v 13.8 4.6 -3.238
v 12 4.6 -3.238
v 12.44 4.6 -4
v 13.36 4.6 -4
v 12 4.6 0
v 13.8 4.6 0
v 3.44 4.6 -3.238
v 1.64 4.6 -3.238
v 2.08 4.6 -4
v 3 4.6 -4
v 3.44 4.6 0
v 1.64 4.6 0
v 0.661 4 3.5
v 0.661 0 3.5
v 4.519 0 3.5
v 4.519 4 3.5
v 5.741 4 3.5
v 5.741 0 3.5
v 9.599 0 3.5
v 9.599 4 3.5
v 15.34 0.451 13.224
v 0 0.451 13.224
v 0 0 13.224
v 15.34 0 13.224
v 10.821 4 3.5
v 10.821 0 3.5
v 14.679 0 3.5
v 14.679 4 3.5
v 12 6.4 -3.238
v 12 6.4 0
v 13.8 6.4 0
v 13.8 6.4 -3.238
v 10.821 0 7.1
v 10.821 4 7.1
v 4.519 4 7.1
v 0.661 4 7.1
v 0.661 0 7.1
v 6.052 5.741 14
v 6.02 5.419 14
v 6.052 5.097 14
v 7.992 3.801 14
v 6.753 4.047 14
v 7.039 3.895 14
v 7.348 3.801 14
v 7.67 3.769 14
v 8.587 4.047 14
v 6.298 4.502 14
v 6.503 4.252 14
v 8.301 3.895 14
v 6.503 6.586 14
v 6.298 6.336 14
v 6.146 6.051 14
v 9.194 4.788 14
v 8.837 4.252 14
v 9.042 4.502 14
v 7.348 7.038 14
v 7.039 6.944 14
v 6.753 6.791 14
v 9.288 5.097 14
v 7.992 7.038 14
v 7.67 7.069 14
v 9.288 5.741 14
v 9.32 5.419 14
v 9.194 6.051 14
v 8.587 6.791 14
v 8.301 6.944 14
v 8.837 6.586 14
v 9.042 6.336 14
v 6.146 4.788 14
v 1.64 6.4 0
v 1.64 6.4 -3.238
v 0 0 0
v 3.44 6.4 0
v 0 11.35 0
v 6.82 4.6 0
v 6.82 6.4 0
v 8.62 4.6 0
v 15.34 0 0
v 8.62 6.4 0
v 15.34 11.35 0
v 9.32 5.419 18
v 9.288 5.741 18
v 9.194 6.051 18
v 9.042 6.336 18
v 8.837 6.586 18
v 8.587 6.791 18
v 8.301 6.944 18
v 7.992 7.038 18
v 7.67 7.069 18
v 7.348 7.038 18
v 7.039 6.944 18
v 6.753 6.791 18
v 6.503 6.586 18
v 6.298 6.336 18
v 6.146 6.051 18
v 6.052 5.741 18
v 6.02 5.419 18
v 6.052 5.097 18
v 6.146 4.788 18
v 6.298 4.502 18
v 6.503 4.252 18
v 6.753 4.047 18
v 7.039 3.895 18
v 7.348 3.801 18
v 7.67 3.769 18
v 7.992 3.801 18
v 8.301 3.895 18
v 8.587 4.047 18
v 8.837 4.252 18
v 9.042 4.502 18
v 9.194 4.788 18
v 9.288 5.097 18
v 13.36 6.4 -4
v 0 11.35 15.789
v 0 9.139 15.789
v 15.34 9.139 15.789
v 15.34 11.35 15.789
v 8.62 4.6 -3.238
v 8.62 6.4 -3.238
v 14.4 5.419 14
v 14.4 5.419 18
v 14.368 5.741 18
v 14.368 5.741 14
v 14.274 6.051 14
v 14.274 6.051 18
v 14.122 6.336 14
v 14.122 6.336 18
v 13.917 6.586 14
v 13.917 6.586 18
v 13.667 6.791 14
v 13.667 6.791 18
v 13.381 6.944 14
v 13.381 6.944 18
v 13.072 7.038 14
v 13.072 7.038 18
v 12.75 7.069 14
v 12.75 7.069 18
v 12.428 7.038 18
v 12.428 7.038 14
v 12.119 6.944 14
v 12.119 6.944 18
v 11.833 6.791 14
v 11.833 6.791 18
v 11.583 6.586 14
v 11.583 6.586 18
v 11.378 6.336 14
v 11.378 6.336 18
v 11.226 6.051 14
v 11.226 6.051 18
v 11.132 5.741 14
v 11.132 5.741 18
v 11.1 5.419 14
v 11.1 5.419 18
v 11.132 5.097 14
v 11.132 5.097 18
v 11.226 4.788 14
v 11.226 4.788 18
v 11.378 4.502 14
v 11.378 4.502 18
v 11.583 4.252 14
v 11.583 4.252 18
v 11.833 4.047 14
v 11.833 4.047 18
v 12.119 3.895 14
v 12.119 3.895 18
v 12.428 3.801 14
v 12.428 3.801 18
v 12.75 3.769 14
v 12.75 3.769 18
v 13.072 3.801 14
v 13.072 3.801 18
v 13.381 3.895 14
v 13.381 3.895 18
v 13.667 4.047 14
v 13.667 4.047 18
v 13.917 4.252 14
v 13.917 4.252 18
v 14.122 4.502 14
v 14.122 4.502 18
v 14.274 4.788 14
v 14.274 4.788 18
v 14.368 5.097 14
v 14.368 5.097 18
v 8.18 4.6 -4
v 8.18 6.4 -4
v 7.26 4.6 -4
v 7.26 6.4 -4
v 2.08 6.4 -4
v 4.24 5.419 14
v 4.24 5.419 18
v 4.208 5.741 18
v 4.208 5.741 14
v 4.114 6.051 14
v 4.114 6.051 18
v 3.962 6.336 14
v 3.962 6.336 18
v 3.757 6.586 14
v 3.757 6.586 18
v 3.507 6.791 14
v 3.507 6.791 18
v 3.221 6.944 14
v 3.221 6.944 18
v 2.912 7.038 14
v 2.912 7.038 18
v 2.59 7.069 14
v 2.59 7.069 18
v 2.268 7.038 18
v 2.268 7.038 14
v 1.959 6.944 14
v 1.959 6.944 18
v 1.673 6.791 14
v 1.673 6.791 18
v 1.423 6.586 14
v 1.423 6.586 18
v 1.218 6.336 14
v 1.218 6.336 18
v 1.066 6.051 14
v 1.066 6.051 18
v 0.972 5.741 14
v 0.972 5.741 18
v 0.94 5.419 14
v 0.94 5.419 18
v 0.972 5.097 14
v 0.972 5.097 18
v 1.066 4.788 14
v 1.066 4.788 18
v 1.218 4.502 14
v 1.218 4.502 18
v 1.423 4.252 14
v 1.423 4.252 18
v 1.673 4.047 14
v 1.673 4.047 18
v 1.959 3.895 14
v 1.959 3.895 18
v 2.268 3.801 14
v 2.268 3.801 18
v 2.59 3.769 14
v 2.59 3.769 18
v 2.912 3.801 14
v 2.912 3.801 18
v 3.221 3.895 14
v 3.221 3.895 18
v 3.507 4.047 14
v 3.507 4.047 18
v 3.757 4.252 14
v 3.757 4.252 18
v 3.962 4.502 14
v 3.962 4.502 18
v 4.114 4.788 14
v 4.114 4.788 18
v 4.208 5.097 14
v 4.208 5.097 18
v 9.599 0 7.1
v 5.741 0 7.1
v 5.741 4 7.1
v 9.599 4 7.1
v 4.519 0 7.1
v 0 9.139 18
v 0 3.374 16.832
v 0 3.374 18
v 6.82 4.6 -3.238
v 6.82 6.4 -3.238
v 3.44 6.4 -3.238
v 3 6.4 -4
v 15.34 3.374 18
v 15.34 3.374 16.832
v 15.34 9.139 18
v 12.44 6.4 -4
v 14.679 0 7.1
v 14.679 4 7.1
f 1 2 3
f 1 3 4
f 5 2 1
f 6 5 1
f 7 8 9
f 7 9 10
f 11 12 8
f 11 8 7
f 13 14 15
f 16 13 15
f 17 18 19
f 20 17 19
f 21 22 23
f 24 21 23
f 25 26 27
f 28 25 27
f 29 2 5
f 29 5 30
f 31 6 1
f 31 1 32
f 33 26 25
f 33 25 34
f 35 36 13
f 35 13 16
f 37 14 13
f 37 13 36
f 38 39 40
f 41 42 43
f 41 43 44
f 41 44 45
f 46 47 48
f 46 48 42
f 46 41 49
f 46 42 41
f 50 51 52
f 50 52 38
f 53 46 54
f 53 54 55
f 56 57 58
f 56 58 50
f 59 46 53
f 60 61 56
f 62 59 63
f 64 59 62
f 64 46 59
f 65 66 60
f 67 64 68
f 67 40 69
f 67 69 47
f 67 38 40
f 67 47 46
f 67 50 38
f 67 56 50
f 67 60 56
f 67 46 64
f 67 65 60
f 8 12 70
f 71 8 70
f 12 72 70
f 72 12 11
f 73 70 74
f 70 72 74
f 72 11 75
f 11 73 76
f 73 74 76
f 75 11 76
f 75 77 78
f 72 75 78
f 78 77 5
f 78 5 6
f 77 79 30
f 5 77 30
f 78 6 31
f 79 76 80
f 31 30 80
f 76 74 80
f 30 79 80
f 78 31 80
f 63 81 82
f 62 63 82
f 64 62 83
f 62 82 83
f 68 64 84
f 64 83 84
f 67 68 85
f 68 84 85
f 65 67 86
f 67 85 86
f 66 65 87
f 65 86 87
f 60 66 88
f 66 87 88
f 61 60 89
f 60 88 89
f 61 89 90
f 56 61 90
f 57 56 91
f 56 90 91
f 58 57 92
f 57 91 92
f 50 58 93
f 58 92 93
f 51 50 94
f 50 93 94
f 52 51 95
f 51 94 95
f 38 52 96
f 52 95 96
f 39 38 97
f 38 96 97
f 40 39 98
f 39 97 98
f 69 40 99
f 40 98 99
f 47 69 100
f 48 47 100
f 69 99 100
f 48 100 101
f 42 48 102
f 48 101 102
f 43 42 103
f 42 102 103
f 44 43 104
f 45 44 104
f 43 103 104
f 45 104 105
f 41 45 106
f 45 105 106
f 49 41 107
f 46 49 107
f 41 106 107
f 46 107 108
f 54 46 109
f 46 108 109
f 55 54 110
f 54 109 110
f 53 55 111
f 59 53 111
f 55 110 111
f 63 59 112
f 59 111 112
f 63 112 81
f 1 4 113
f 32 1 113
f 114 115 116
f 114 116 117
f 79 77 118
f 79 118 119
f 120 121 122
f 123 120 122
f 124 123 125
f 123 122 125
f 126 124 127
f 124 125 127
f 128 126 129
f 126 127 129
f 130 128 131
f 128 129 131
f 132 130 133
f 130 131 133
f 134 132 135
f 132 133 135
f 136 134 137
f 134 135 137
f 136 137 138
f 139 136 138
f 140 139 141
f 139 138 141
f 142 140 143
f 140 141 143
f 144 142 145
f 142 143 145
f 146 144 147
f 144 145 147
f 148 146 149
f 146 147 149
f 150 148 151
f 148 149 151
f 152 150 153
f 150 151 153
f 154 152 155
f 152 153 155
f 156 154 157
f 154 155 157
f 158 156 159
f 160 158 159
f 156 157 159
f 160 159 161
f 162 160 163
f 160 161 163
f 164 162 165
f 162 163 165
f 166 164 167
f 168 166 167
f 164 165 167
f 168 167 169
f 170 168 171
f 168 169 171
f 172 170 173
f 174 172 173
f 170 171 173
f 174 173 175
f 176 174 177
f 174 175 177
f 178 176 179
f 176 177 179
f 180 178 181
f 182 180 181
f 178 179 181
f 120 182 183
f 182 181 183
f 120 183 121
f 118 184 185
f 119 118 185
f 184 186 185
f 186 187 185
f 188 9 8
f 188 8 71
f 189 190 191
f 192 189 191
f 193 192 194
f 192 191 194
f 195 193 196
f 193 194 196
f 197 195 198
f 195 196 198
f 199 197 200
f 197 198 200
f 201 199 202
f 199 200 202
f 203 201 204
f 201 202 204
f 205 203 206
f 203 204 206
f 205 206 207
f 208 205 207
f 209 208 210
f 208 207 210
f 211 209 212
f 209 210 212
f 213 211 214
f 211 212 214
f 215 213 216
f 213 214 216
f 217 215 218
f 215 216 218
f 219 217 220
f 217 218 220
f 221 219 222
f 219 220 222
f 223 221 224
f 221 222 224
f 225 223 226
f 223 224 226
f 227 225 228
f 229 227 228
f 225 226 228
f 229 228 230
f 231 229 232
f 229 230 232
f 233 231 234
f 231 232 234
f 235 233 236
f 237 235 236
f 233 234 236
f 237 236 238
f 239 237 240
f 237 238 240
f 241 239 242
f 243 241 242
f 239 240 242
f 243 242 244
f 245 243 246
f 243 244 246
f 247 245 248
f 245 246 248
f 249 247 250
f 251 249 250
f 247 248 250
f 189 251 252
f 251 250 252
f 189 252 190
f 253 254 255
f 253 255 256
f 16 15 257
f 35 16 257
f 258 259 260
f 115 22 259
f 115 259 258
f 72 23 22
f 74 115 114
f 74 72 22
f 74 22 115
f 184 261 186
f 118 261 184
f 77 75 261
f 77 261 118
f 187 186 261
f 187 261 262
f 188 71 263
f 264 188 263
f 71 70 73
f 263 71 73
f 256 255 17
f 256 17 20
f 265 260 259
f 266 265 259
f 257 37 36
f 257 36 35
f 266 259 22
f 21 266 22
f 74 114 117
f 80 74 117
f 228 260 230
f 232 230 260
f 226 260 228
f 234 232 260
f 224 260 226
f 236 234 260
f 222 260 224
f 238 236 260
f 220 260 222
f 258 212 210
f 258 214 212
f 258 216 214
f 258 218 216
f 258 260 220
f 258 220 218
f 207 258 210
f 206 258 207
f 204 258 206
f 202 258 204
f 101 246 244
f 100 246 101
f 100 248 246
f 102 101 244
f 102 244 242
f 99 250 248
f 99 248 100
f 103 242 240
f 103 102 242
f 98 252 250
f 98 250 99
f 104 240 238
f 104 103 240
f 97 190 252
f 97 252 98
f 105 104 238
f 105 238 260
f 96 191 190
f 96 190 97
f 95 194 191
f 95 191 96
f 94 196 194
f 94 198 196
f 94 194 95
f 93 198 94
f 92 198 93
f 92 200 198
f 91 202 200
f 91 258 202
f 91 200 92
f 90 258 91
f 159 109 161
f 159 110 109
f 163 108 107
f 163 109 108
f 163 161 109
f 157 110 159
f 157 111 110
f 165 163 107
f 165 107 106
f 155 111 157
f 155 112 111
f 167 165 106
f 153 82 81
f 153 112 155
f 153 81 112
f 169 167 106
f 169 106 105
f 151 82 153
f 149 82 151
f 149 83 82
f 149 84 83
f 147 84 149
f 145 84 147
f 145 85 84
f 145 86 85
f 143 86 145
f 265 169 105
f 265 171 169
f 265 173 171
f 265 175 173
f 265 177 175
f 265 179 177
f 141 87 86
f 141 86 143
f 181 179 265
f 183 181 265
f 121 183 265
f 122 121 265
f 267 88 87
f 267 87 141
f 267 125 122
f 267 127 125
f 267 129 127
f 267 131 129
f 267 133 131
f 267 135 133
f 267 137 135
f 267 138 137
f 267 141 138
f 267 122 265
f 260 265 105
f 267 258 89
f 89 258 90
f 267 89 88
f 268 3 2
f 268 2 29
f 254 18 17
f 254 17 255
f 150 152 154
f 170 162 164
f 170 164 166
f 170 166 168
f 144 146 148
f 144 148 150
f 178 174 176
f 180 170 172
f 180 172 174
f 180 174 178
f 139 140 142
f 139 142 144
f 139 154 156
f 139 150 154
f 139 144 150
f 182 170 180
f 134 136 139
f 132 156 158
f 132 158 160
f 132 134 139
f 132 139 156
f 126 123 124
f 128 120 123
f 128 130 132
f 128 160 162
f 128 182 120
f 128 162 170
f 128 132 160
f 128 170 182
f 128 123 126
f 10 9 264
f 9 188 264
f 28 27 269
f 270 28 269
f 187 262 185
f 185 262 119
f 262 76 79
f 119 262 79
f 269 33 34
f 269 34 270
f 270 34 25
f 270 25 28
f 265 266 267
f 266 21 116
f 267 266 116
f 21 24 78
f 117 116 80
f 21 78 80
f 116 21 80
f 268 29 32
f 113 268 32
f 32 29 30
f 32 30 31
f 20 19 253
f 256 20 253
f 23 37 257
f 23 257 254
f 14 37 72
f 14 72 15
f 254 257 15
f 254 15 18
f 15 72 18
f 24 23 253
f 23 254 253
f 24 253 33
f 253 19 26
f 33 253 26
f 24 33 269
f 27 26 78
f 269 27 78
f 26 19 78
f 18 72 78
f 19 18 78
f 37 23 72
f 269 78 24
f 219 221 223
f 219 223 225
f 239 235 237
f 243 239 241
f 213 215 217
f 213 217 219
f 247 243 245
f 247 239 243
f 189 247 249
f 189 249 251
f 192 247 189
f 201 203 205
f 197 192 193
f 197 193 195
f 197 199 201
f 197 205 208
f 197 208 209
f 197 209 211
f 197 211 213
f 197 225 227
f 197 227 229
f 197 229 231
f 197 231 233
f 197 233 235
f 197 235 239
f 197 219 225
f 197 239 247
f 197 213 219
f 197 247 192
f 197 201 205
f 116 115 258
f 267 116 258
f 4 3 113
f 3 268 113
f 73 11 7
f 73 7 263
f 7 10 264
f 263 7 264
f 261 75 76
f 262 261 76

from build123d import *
from OCP.BRepFilletAPI import BRepFilletAPI_MakeChamfer

# Parameters (mm, degrees)
SKETCH1_W           = 15.34
SKETCH1_H           = 11.35
BOSS_EXTRUDE1_DEPTH = 18
SKETCH1_3_W         = 1.8
SKETCH1_3_H         = 1.8
BOSS_EXTRUDE2_DEPTH = 4
CHAMFER1_SIZE       = 0.762
CHAMFER1_SIZE2      = 0.439940905
SKETCH3_W           = 2.211259549
SKETCH3_H           = 2.211259549
CUT_EXTRUDE1_DEPTH  = 27.232386472
SKETCH4_R           = 1.650097839
CUT_EXTRUDE2_DEPTH  = 4
SKETCH2_W           = 3.858538726
SKETCH2_H           = 3.6
CUT_EXTRUDE3_DEPTH  = 4


with BuildPart() as part:
    # Sketch1 → Boss-Extrude1 (new body)
    with BuildSketch(Plane.XY):
        with Locations((7.67, 5.675)):
            Rectangle(SKETCH1_W, SKETCH1_H)
    extrude(amount=BOSS_EXTRUDE1_DEPTH)

    # Sketch1<3> → Boss-Extrude2 (add)
    with BuildSketch(Plane.XY):
        with Locations((2.54, 5.5)):
            Rectangle(SKETCH1_3_W, SKETCH1_3_H)
        with Locations((7.72, 5.5)):
            Rectangle(SKETCH1_3_W, SKETCH1_3_H)
        with Locations((12.9, 5.5)):
            Rectangle(SKETCH1_3_W, SKETCH1_3_H)
    extrude(amount=-BOSS_EXTRUDE2_DEPTH)

    # Chamfer1: one chamfer whose edges measure the first distance from different faces: ONE call of the kernel's chamfer builder (chamfer() names one face for all edges)
    chamfer1_edges_1 = [part.edges().sort_by_distance(p)[0] for p in [
        (1.64, 5.5, -4),
    ]]
    chamfer1_side_1 = [part.faces().sort_by_distance(p)[0] for p in [
        (1.64, 5.5, -2),
    ]]
    chamfer1_edges_2 = [part.edges().sort_by_distance(p)[0] for p in [
        (3.44, 5.5, -4),
    ]]
    chamfer1_side_2 = [part.faces().sort_by_distance(p)[0] for p in [
        (3.44, 5.5, -2),
    ]]
    chamfer1_edges_3 = [part.edges().sort_by_distance(p)[0] for p in [
        (6.82, 5.5, -4),
    ]]
    chamfer1_side_3 = [part.faces().sort_by_distance(p)[0] for p in [
        (6.82, 5.5, -2),
    ]]
    chamfer1_edges_4 = [part.edges().sort_by_distance(p)[0] for p in [
        (8.62, 5.5, -4),
    ]]
    chamfer1_side_4 = [part.faces().sort_by_distance(p)[0] for p in [
        (8.62, 5.5, -2),
    ]]
    chamfer1_edges_5 = [part.edges().sort_by_distance(p)[0] for p in [
        (12, 5.5, -4),
    ]]
    chamfer1_side_5 = [part.faces().sort_by_distance(p)[0] for p in [
        (12, 5.5, -2),
    ]]
    chamfer1_edges_6 = [part.edges().sort_by_distance(p)[0] for p in [
        (13.8, 5.5, -4),
    ]]
    chamfer1_side_6 = [part.faces().sort_by_distance(p)[0] for p in [
        (13.8, 5.5, -2),
    ]]
    chamfer1 = BRepFilletAPI_MakeChamfer(part.part.solid().wrapped)
    for e in chamfer1_edges_1:
        chamfer1.Add(CHAMFER1_SIZE, CHAMFER1_SIZE2, e.wrapped, chamfer1_side_1[0].wrapped)  # the first distance lies on this face
    for e in chamfer1_edges_2:
        chamfer1.Add(CHAMFER1_SIZE, CHAMFER1_SIZE2, e.wrapped, chamfer1_side_2[0].wrapped)  # the first distance lies on this face
    for e in chamfer1_edges_3:
        chamfer1.Add(CHAMFER1_SIZE, CHAMFER1_SIZE2, e.wrapped, chamfer1_side_3[0].wrapped)  # the first distance lies on this face
    for e in chamfer1_edges_4:
        chamfer1.Add(CHAMFER1_SIZE, CHAMFER1_SIZE2, e.wrapped, chamfer1_side_4[0].wrapped)  # the first distance lies on this face
    for e in chamfer1_edges_5:
        chamfer1.Add(CHAMFER1_SIZE, CHAMFER1_SIZE2, e.wrapped, chamfer1_side_5[0].wrapped)  # the first distance lies on this face
    for e in chamfer1_edges_6:
        chamfer1.Add(CHAMFER1_SIZE, CHAMFER1_SIZE2, e.wrapped, chamfer1_side_6[0].wrapped)  # the first distance lies on this face
    add(Compound.cast(chamfer1.Shape()), mode=Mode.REPLACE)

    # Sketch3 → Cut-Extrude1 (cut, through all)
    with BuildSketch(Plane.ZY):
        with Locations((16.894370226, 10.244370226)):
            Rectangle(SKETCH3_W, SKETCH3_H)
        Polygon((18, 0), (18, 3.37428008), (16.831701498, 3.37428008), (13.224191742, 0.450816104), (13.224191742, 0), align=None)
    extrude(amount=-CUT_EXTRUDE1_DEPTH, mode=Mode.SUBTRACT)

    # Sketch4 → Cut-Extrude2 (cut)
    with BuildSketch(Plane.XY.offset(18)):
        with Locations((2.59, 5.419196483)):
            Circle(SKETCH4_R)
        with Locations((7.67, 5.419196483)):
            Circle(SKETCH4_R)
        with Locations((12.75, 5.419196483)):
            Circle(SKETCH4_R)
    extrude(amount=-CUT_EXTRUDE2_DEPTH, mode=Mode.SUBTRACT)

    # Sketch2 → Cut-Extrude3 (cut)
    with BuildSketch(Plane.XZ):
        with Locations((2.59, 5.3)):
            Rectangle(SKETCH2_W, SKETCH2_H)
        with Locations((7.67, 5.3)):
            Rectangle(SKETCH2_W, SKETCH2_H)
        with Locations((12.75, 5.3)):
            Rectangle(SKETCH2_W, SKETCH2_H)
    extrude(amount=-CUT_EXTRUDE3_DEPTH, mode=Mode.SUBTRACT)


solid = part.part
